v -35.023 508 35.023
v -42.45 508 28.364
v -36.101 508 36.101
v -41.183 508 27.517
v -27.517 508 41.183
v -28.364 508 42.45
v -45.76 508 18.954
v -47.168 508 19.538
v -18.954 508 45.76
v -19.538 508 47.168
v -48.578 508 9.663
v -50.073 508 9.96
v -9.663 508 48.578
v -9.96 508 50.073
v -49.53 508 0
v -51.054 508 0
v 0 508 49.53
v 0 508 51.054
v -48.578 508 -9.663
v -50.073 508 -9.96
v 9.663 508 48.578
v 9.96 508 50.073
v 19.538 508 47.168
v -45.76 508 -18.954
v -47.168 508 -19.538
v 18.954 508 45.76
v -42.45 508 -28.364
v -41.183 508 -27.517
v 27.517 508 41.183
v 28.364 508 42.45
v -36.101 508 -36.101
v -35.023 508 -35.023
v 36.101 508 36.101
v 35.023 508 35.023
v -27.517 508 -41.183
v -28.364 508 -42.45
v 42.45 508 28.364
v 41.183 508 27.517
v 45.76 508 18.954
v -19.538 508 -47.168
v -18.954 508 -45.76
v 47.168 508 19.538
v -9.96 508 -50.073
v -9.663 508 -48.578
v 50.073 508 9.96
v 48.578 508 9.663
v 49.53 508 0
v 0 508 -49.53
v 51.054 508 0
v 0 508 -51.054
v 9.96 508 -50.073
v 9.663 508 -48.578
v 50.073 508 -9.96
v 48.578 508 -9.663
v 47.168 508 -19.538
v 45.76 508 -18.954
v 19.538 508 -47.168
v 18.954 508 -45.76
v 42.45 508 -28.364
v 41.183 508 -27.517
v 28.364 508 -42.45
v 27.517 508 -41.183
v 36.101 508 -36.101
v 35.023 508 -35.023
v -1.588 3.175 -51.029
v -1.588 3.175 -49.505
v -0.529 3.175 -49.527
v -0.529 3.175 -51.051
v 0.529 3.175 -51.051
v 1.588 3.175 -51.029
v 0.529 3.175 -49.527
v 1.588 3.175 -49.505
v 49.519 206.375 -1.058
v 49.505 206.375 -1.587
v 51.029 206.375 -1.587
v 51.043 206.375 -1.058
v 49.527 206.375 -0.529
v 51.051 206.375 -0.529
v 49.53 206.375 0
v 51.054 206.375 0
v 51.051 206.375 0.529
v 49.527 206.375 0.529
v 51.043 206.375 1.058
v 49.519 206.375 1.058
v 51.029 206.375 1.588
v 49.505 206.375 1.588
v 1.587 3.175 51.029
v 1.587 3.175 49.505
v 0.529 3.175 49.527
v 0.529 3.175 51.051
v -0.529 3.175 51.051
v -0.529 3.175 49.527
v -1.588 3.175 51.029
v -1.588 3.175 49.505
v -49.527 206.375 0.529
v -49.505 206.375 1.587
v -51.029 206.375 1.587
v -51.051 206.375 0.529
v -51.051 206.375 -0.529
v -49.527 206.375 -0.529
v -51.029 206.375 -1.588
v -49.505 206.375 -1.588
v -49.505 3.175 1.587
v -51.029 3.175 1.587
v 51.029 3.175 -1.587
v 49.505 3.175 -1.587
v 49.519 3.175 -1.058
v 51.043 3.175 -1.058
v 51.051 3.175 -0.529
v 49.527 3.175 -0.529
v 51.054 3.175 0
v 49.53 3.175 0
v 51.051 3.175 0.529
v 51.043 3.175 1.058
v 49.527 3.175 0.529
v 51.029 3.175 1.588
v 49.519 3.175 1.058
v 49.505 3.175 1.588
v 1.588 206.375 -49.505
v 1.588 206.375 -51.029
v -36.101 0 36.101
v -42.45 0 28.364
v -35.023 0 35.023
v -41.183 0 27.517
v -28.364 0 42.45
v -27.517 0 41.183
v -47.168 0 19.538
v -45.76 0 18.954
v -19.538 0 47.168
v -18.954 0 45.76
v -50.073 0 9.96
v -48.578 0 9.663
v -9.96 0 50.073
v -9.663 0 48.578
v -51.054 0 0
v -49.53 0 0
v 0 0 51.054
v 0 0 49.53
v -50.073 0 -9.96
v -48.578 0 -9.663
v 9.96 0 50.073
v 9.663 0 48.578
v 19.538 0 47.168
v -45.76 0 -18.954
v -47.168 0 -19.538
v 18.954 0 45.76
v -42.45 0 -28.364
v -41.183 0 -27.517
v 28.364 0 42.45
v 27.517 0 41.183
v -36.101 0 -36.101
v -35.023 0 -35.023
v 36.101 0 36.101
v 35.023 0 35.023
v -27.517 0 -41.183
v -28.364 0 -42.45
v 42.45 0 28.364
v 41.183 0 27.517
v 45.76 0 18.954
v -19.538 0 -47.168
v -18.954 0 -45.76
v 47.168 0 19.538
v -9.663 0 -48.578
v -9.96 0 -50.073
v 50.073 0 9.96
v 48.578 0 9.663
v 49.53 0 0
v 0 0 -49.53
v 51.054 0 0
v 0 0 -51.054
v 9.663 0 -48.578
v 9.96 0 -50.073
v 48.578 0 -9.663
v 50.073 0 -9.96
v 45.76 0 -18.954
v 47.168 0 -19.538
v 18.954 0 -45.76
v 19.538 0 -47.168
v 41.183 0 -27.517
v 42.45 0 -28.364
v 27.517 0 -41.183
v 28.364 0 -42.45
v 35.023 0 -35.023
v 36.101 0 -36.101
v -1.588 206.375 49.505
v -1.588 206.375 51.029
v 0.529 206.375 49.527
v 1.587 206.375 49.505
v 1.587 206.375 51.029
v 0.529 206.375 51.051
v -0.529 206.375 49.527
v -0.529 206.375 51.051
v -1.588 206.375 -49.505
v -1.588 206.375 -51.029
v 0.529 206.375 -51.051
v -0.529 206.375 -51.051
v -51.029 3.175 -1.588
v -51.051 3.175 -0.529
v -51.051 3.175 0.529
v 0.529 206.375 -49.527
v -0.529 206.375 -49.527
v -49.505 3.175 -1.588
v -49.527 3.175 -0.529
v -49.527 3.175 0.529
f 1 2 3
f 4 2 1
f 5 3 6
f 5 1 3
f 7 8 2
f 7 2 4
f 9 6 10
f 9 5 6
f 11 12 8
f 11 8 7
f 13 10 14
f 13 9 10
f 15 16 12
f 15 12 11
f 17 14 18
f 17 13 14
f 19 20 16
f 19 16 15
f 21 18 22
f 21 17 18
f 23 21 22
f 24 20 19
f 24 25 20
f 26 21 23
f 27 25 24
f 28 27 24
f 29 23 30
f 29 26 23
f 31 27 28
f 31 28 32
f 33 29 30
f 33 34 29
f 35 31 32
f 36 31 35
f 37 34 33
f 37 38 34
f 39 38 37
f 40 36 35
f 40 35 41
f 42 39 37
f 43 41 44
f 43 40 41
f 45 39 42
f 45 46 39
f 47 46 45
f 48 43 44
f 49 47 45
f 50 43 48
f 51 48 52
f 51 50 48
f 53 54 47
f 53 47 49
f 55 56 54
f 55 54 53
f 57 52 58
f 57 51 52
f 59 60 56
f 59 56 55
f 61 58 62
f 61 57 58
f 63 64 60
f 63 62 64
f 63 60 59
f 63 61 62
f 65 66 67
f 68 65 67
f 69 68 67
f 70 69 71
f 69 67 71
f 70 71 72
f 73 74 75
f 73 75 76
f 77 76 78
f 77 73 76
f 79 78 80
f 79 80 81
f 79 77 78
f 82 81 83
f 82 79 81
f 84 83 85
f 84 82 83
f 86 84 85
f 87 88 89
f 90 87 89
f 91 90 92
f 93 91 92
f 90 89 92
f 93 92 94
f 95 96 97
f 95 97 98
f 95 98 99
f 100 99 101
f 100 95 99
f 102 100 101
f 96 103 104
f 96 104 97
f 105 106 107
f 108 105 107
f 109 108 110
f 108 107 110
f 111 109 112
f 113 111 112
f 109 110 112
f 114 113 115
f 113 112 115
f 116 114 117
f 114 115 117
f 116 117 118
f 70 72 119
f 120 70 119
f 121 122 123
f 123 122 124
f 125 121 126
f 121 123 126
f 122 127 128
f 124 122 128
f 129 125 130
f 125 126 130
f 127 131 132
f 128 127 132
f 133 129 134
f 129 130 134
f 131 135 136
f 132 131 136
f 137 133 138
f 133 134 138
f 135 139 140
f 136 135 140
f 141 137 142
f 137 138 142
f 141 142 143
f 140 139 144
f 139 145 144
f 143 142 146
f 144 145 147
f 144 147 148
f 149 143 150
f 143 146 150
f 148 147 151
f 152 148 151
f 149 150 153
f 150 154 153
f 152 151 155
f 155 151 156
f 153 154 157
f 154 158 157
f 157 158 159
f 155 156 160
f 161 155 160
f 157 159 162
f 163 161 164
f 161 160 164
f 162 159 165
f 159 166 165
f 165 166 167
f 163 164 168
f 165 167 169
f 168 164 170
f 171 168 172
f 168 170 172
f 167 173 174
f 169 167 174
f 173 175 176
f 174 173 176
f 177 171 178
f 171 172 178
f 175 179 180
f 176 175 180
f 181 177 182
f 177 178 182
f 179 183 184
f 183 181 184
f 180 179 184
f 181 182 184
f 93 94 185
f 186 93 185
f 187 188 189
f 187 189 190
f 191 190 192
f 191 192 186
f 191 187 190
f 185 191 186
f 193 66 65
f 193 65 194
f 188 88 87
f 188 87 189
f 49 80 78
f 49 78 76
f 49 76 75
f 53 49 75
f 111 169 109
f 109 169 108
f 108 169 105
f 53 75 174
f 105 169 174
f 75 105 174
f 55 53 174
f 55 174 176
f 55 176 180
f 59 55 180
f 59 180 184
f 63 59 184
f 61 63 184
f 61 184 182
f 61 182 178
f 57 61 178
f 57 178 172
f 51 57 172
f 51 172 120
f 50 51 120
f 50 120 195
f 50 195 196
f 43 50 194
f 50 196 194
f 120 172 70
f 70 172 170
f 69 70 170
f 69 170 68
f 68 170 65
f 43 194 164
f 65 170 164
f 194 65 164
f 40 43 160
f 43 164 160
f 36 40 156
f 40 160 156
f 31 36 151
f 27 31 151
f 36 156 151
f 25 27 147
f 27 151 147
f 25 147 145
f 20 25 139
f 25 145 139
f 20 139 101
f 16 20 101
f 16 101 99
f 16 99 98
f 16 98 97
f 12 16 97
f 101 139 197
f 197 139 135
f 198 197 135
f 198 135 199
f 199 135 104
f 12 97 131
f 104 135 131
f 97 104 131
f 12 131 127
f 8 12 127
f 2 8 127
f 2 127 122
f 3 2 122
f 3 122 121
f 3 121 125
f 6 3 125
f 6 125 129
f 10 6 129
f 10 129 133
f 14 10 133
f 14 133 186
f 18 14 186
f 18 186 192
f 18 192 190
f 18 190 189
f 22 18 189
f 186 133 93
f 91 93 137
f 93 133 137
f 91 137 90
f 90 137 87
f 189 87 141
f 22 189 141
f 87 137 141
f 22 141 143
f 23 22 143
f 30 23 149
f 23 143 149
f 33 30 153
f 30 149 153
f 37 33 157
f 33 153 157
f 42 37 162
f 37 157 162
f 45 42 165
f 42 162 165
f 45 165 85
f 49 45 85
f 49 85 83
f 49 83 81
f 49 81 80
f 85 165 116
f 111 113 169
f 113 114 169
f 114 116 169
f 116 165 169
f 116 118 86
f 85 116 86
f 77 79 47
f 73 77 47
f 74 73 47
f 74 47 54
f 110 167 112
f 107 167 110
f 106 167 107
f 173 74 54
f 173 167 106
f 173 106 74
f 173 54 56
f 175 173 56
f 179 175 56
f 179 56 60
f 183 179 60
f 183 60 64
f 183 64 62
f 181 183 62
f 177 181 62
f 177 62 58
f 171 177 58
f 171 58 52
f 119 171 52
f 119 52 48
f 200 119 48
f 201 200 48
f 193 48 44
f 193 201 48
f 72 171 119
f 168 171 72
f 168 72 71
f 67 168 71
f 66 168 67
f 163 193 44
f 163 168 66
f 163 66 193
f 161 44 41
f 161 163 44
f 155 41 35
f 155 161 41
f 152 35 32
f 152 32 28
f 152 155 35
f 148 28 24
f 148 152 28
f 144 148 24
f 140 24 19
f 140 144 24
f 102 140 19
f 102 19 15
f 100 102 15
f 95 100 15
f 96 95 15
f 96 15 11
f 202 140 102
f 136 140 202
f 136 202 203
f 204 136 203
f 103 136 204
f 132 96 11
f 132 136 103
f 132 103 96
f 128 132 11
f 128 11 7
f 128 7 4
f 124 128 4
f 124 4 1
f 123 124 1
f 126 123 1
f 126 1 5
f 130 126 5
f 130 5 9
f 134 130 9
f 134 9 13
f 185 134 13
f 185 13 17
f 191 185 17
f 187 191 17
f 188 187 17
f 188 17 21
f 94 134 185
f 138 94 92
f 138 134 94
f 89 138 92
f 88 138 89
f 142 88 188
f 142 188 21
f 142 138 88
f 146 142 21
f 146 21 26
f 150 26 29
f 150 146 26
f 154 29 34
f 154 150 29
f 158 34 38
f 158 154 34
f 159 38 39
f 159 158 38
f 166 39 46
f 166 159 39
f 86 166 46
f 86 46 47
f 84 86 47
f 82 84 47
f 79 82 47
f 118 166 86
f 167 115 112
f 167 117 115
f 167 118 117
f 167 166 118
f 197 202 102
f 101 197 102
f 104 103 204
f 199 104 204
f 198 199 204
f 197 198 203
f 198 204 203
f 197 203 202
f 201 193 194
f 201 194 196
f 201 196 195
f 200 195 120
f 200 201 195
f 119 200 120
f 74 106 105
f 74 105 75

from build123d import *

# Parameters (mm, degrees)
SKETCH1_R           = 51.054
SKETCH1_R_2         = 49.53
BOSS_EXTRUDE1_DEPTH = 508
SKETCH2_W           = 3.175
SKETCH2_H           = 203.2
CUT_EXTRUDE1_DEPTH  = 52.054
CIRPATTERN1_COUNT   = 4


with BuildPart() as part:
    # Sketch1 → Boss-Extrude1 (new body)
    with BuildSketch(Plane(origin=(0, 0, 0), x_dir=(1, 0, 0), z_dir=(0, 1, 0))):
        Circle(SKETCH1_R)
        Circle(SKETCH1_R_2, mode=Mode.SUBTRACT)
    extrude(amount=BOSS_EXTRUDE1_DEPTH)

    # Sketch2 → Cut-Extrude1 (cut, through all)
    with BuildSketch(Plane.XY):
        with Locations((0, 104.775)):
            Rectangle(SKETCH2_W, SKETCH2_H)
    cut_extrude1 = extrude(amount=-CUT_EXTRUDE1_DEPTH, mode=Mode.SUBTRACT)

    # CirPattern1: Cut-Extrude1 ×4 about axis
    cirpattern1_axis = Axis((0, 0, 0), (0, 1, 0))
    for i in range(1, CIRPATTERN1_COUNT):
        add(cut_extrude1.rotate(cirpattern1_axis, i * 360 / CIRPATTERN1_COUNT), mode=Mode.SUBTRACT)


solid = part.part
